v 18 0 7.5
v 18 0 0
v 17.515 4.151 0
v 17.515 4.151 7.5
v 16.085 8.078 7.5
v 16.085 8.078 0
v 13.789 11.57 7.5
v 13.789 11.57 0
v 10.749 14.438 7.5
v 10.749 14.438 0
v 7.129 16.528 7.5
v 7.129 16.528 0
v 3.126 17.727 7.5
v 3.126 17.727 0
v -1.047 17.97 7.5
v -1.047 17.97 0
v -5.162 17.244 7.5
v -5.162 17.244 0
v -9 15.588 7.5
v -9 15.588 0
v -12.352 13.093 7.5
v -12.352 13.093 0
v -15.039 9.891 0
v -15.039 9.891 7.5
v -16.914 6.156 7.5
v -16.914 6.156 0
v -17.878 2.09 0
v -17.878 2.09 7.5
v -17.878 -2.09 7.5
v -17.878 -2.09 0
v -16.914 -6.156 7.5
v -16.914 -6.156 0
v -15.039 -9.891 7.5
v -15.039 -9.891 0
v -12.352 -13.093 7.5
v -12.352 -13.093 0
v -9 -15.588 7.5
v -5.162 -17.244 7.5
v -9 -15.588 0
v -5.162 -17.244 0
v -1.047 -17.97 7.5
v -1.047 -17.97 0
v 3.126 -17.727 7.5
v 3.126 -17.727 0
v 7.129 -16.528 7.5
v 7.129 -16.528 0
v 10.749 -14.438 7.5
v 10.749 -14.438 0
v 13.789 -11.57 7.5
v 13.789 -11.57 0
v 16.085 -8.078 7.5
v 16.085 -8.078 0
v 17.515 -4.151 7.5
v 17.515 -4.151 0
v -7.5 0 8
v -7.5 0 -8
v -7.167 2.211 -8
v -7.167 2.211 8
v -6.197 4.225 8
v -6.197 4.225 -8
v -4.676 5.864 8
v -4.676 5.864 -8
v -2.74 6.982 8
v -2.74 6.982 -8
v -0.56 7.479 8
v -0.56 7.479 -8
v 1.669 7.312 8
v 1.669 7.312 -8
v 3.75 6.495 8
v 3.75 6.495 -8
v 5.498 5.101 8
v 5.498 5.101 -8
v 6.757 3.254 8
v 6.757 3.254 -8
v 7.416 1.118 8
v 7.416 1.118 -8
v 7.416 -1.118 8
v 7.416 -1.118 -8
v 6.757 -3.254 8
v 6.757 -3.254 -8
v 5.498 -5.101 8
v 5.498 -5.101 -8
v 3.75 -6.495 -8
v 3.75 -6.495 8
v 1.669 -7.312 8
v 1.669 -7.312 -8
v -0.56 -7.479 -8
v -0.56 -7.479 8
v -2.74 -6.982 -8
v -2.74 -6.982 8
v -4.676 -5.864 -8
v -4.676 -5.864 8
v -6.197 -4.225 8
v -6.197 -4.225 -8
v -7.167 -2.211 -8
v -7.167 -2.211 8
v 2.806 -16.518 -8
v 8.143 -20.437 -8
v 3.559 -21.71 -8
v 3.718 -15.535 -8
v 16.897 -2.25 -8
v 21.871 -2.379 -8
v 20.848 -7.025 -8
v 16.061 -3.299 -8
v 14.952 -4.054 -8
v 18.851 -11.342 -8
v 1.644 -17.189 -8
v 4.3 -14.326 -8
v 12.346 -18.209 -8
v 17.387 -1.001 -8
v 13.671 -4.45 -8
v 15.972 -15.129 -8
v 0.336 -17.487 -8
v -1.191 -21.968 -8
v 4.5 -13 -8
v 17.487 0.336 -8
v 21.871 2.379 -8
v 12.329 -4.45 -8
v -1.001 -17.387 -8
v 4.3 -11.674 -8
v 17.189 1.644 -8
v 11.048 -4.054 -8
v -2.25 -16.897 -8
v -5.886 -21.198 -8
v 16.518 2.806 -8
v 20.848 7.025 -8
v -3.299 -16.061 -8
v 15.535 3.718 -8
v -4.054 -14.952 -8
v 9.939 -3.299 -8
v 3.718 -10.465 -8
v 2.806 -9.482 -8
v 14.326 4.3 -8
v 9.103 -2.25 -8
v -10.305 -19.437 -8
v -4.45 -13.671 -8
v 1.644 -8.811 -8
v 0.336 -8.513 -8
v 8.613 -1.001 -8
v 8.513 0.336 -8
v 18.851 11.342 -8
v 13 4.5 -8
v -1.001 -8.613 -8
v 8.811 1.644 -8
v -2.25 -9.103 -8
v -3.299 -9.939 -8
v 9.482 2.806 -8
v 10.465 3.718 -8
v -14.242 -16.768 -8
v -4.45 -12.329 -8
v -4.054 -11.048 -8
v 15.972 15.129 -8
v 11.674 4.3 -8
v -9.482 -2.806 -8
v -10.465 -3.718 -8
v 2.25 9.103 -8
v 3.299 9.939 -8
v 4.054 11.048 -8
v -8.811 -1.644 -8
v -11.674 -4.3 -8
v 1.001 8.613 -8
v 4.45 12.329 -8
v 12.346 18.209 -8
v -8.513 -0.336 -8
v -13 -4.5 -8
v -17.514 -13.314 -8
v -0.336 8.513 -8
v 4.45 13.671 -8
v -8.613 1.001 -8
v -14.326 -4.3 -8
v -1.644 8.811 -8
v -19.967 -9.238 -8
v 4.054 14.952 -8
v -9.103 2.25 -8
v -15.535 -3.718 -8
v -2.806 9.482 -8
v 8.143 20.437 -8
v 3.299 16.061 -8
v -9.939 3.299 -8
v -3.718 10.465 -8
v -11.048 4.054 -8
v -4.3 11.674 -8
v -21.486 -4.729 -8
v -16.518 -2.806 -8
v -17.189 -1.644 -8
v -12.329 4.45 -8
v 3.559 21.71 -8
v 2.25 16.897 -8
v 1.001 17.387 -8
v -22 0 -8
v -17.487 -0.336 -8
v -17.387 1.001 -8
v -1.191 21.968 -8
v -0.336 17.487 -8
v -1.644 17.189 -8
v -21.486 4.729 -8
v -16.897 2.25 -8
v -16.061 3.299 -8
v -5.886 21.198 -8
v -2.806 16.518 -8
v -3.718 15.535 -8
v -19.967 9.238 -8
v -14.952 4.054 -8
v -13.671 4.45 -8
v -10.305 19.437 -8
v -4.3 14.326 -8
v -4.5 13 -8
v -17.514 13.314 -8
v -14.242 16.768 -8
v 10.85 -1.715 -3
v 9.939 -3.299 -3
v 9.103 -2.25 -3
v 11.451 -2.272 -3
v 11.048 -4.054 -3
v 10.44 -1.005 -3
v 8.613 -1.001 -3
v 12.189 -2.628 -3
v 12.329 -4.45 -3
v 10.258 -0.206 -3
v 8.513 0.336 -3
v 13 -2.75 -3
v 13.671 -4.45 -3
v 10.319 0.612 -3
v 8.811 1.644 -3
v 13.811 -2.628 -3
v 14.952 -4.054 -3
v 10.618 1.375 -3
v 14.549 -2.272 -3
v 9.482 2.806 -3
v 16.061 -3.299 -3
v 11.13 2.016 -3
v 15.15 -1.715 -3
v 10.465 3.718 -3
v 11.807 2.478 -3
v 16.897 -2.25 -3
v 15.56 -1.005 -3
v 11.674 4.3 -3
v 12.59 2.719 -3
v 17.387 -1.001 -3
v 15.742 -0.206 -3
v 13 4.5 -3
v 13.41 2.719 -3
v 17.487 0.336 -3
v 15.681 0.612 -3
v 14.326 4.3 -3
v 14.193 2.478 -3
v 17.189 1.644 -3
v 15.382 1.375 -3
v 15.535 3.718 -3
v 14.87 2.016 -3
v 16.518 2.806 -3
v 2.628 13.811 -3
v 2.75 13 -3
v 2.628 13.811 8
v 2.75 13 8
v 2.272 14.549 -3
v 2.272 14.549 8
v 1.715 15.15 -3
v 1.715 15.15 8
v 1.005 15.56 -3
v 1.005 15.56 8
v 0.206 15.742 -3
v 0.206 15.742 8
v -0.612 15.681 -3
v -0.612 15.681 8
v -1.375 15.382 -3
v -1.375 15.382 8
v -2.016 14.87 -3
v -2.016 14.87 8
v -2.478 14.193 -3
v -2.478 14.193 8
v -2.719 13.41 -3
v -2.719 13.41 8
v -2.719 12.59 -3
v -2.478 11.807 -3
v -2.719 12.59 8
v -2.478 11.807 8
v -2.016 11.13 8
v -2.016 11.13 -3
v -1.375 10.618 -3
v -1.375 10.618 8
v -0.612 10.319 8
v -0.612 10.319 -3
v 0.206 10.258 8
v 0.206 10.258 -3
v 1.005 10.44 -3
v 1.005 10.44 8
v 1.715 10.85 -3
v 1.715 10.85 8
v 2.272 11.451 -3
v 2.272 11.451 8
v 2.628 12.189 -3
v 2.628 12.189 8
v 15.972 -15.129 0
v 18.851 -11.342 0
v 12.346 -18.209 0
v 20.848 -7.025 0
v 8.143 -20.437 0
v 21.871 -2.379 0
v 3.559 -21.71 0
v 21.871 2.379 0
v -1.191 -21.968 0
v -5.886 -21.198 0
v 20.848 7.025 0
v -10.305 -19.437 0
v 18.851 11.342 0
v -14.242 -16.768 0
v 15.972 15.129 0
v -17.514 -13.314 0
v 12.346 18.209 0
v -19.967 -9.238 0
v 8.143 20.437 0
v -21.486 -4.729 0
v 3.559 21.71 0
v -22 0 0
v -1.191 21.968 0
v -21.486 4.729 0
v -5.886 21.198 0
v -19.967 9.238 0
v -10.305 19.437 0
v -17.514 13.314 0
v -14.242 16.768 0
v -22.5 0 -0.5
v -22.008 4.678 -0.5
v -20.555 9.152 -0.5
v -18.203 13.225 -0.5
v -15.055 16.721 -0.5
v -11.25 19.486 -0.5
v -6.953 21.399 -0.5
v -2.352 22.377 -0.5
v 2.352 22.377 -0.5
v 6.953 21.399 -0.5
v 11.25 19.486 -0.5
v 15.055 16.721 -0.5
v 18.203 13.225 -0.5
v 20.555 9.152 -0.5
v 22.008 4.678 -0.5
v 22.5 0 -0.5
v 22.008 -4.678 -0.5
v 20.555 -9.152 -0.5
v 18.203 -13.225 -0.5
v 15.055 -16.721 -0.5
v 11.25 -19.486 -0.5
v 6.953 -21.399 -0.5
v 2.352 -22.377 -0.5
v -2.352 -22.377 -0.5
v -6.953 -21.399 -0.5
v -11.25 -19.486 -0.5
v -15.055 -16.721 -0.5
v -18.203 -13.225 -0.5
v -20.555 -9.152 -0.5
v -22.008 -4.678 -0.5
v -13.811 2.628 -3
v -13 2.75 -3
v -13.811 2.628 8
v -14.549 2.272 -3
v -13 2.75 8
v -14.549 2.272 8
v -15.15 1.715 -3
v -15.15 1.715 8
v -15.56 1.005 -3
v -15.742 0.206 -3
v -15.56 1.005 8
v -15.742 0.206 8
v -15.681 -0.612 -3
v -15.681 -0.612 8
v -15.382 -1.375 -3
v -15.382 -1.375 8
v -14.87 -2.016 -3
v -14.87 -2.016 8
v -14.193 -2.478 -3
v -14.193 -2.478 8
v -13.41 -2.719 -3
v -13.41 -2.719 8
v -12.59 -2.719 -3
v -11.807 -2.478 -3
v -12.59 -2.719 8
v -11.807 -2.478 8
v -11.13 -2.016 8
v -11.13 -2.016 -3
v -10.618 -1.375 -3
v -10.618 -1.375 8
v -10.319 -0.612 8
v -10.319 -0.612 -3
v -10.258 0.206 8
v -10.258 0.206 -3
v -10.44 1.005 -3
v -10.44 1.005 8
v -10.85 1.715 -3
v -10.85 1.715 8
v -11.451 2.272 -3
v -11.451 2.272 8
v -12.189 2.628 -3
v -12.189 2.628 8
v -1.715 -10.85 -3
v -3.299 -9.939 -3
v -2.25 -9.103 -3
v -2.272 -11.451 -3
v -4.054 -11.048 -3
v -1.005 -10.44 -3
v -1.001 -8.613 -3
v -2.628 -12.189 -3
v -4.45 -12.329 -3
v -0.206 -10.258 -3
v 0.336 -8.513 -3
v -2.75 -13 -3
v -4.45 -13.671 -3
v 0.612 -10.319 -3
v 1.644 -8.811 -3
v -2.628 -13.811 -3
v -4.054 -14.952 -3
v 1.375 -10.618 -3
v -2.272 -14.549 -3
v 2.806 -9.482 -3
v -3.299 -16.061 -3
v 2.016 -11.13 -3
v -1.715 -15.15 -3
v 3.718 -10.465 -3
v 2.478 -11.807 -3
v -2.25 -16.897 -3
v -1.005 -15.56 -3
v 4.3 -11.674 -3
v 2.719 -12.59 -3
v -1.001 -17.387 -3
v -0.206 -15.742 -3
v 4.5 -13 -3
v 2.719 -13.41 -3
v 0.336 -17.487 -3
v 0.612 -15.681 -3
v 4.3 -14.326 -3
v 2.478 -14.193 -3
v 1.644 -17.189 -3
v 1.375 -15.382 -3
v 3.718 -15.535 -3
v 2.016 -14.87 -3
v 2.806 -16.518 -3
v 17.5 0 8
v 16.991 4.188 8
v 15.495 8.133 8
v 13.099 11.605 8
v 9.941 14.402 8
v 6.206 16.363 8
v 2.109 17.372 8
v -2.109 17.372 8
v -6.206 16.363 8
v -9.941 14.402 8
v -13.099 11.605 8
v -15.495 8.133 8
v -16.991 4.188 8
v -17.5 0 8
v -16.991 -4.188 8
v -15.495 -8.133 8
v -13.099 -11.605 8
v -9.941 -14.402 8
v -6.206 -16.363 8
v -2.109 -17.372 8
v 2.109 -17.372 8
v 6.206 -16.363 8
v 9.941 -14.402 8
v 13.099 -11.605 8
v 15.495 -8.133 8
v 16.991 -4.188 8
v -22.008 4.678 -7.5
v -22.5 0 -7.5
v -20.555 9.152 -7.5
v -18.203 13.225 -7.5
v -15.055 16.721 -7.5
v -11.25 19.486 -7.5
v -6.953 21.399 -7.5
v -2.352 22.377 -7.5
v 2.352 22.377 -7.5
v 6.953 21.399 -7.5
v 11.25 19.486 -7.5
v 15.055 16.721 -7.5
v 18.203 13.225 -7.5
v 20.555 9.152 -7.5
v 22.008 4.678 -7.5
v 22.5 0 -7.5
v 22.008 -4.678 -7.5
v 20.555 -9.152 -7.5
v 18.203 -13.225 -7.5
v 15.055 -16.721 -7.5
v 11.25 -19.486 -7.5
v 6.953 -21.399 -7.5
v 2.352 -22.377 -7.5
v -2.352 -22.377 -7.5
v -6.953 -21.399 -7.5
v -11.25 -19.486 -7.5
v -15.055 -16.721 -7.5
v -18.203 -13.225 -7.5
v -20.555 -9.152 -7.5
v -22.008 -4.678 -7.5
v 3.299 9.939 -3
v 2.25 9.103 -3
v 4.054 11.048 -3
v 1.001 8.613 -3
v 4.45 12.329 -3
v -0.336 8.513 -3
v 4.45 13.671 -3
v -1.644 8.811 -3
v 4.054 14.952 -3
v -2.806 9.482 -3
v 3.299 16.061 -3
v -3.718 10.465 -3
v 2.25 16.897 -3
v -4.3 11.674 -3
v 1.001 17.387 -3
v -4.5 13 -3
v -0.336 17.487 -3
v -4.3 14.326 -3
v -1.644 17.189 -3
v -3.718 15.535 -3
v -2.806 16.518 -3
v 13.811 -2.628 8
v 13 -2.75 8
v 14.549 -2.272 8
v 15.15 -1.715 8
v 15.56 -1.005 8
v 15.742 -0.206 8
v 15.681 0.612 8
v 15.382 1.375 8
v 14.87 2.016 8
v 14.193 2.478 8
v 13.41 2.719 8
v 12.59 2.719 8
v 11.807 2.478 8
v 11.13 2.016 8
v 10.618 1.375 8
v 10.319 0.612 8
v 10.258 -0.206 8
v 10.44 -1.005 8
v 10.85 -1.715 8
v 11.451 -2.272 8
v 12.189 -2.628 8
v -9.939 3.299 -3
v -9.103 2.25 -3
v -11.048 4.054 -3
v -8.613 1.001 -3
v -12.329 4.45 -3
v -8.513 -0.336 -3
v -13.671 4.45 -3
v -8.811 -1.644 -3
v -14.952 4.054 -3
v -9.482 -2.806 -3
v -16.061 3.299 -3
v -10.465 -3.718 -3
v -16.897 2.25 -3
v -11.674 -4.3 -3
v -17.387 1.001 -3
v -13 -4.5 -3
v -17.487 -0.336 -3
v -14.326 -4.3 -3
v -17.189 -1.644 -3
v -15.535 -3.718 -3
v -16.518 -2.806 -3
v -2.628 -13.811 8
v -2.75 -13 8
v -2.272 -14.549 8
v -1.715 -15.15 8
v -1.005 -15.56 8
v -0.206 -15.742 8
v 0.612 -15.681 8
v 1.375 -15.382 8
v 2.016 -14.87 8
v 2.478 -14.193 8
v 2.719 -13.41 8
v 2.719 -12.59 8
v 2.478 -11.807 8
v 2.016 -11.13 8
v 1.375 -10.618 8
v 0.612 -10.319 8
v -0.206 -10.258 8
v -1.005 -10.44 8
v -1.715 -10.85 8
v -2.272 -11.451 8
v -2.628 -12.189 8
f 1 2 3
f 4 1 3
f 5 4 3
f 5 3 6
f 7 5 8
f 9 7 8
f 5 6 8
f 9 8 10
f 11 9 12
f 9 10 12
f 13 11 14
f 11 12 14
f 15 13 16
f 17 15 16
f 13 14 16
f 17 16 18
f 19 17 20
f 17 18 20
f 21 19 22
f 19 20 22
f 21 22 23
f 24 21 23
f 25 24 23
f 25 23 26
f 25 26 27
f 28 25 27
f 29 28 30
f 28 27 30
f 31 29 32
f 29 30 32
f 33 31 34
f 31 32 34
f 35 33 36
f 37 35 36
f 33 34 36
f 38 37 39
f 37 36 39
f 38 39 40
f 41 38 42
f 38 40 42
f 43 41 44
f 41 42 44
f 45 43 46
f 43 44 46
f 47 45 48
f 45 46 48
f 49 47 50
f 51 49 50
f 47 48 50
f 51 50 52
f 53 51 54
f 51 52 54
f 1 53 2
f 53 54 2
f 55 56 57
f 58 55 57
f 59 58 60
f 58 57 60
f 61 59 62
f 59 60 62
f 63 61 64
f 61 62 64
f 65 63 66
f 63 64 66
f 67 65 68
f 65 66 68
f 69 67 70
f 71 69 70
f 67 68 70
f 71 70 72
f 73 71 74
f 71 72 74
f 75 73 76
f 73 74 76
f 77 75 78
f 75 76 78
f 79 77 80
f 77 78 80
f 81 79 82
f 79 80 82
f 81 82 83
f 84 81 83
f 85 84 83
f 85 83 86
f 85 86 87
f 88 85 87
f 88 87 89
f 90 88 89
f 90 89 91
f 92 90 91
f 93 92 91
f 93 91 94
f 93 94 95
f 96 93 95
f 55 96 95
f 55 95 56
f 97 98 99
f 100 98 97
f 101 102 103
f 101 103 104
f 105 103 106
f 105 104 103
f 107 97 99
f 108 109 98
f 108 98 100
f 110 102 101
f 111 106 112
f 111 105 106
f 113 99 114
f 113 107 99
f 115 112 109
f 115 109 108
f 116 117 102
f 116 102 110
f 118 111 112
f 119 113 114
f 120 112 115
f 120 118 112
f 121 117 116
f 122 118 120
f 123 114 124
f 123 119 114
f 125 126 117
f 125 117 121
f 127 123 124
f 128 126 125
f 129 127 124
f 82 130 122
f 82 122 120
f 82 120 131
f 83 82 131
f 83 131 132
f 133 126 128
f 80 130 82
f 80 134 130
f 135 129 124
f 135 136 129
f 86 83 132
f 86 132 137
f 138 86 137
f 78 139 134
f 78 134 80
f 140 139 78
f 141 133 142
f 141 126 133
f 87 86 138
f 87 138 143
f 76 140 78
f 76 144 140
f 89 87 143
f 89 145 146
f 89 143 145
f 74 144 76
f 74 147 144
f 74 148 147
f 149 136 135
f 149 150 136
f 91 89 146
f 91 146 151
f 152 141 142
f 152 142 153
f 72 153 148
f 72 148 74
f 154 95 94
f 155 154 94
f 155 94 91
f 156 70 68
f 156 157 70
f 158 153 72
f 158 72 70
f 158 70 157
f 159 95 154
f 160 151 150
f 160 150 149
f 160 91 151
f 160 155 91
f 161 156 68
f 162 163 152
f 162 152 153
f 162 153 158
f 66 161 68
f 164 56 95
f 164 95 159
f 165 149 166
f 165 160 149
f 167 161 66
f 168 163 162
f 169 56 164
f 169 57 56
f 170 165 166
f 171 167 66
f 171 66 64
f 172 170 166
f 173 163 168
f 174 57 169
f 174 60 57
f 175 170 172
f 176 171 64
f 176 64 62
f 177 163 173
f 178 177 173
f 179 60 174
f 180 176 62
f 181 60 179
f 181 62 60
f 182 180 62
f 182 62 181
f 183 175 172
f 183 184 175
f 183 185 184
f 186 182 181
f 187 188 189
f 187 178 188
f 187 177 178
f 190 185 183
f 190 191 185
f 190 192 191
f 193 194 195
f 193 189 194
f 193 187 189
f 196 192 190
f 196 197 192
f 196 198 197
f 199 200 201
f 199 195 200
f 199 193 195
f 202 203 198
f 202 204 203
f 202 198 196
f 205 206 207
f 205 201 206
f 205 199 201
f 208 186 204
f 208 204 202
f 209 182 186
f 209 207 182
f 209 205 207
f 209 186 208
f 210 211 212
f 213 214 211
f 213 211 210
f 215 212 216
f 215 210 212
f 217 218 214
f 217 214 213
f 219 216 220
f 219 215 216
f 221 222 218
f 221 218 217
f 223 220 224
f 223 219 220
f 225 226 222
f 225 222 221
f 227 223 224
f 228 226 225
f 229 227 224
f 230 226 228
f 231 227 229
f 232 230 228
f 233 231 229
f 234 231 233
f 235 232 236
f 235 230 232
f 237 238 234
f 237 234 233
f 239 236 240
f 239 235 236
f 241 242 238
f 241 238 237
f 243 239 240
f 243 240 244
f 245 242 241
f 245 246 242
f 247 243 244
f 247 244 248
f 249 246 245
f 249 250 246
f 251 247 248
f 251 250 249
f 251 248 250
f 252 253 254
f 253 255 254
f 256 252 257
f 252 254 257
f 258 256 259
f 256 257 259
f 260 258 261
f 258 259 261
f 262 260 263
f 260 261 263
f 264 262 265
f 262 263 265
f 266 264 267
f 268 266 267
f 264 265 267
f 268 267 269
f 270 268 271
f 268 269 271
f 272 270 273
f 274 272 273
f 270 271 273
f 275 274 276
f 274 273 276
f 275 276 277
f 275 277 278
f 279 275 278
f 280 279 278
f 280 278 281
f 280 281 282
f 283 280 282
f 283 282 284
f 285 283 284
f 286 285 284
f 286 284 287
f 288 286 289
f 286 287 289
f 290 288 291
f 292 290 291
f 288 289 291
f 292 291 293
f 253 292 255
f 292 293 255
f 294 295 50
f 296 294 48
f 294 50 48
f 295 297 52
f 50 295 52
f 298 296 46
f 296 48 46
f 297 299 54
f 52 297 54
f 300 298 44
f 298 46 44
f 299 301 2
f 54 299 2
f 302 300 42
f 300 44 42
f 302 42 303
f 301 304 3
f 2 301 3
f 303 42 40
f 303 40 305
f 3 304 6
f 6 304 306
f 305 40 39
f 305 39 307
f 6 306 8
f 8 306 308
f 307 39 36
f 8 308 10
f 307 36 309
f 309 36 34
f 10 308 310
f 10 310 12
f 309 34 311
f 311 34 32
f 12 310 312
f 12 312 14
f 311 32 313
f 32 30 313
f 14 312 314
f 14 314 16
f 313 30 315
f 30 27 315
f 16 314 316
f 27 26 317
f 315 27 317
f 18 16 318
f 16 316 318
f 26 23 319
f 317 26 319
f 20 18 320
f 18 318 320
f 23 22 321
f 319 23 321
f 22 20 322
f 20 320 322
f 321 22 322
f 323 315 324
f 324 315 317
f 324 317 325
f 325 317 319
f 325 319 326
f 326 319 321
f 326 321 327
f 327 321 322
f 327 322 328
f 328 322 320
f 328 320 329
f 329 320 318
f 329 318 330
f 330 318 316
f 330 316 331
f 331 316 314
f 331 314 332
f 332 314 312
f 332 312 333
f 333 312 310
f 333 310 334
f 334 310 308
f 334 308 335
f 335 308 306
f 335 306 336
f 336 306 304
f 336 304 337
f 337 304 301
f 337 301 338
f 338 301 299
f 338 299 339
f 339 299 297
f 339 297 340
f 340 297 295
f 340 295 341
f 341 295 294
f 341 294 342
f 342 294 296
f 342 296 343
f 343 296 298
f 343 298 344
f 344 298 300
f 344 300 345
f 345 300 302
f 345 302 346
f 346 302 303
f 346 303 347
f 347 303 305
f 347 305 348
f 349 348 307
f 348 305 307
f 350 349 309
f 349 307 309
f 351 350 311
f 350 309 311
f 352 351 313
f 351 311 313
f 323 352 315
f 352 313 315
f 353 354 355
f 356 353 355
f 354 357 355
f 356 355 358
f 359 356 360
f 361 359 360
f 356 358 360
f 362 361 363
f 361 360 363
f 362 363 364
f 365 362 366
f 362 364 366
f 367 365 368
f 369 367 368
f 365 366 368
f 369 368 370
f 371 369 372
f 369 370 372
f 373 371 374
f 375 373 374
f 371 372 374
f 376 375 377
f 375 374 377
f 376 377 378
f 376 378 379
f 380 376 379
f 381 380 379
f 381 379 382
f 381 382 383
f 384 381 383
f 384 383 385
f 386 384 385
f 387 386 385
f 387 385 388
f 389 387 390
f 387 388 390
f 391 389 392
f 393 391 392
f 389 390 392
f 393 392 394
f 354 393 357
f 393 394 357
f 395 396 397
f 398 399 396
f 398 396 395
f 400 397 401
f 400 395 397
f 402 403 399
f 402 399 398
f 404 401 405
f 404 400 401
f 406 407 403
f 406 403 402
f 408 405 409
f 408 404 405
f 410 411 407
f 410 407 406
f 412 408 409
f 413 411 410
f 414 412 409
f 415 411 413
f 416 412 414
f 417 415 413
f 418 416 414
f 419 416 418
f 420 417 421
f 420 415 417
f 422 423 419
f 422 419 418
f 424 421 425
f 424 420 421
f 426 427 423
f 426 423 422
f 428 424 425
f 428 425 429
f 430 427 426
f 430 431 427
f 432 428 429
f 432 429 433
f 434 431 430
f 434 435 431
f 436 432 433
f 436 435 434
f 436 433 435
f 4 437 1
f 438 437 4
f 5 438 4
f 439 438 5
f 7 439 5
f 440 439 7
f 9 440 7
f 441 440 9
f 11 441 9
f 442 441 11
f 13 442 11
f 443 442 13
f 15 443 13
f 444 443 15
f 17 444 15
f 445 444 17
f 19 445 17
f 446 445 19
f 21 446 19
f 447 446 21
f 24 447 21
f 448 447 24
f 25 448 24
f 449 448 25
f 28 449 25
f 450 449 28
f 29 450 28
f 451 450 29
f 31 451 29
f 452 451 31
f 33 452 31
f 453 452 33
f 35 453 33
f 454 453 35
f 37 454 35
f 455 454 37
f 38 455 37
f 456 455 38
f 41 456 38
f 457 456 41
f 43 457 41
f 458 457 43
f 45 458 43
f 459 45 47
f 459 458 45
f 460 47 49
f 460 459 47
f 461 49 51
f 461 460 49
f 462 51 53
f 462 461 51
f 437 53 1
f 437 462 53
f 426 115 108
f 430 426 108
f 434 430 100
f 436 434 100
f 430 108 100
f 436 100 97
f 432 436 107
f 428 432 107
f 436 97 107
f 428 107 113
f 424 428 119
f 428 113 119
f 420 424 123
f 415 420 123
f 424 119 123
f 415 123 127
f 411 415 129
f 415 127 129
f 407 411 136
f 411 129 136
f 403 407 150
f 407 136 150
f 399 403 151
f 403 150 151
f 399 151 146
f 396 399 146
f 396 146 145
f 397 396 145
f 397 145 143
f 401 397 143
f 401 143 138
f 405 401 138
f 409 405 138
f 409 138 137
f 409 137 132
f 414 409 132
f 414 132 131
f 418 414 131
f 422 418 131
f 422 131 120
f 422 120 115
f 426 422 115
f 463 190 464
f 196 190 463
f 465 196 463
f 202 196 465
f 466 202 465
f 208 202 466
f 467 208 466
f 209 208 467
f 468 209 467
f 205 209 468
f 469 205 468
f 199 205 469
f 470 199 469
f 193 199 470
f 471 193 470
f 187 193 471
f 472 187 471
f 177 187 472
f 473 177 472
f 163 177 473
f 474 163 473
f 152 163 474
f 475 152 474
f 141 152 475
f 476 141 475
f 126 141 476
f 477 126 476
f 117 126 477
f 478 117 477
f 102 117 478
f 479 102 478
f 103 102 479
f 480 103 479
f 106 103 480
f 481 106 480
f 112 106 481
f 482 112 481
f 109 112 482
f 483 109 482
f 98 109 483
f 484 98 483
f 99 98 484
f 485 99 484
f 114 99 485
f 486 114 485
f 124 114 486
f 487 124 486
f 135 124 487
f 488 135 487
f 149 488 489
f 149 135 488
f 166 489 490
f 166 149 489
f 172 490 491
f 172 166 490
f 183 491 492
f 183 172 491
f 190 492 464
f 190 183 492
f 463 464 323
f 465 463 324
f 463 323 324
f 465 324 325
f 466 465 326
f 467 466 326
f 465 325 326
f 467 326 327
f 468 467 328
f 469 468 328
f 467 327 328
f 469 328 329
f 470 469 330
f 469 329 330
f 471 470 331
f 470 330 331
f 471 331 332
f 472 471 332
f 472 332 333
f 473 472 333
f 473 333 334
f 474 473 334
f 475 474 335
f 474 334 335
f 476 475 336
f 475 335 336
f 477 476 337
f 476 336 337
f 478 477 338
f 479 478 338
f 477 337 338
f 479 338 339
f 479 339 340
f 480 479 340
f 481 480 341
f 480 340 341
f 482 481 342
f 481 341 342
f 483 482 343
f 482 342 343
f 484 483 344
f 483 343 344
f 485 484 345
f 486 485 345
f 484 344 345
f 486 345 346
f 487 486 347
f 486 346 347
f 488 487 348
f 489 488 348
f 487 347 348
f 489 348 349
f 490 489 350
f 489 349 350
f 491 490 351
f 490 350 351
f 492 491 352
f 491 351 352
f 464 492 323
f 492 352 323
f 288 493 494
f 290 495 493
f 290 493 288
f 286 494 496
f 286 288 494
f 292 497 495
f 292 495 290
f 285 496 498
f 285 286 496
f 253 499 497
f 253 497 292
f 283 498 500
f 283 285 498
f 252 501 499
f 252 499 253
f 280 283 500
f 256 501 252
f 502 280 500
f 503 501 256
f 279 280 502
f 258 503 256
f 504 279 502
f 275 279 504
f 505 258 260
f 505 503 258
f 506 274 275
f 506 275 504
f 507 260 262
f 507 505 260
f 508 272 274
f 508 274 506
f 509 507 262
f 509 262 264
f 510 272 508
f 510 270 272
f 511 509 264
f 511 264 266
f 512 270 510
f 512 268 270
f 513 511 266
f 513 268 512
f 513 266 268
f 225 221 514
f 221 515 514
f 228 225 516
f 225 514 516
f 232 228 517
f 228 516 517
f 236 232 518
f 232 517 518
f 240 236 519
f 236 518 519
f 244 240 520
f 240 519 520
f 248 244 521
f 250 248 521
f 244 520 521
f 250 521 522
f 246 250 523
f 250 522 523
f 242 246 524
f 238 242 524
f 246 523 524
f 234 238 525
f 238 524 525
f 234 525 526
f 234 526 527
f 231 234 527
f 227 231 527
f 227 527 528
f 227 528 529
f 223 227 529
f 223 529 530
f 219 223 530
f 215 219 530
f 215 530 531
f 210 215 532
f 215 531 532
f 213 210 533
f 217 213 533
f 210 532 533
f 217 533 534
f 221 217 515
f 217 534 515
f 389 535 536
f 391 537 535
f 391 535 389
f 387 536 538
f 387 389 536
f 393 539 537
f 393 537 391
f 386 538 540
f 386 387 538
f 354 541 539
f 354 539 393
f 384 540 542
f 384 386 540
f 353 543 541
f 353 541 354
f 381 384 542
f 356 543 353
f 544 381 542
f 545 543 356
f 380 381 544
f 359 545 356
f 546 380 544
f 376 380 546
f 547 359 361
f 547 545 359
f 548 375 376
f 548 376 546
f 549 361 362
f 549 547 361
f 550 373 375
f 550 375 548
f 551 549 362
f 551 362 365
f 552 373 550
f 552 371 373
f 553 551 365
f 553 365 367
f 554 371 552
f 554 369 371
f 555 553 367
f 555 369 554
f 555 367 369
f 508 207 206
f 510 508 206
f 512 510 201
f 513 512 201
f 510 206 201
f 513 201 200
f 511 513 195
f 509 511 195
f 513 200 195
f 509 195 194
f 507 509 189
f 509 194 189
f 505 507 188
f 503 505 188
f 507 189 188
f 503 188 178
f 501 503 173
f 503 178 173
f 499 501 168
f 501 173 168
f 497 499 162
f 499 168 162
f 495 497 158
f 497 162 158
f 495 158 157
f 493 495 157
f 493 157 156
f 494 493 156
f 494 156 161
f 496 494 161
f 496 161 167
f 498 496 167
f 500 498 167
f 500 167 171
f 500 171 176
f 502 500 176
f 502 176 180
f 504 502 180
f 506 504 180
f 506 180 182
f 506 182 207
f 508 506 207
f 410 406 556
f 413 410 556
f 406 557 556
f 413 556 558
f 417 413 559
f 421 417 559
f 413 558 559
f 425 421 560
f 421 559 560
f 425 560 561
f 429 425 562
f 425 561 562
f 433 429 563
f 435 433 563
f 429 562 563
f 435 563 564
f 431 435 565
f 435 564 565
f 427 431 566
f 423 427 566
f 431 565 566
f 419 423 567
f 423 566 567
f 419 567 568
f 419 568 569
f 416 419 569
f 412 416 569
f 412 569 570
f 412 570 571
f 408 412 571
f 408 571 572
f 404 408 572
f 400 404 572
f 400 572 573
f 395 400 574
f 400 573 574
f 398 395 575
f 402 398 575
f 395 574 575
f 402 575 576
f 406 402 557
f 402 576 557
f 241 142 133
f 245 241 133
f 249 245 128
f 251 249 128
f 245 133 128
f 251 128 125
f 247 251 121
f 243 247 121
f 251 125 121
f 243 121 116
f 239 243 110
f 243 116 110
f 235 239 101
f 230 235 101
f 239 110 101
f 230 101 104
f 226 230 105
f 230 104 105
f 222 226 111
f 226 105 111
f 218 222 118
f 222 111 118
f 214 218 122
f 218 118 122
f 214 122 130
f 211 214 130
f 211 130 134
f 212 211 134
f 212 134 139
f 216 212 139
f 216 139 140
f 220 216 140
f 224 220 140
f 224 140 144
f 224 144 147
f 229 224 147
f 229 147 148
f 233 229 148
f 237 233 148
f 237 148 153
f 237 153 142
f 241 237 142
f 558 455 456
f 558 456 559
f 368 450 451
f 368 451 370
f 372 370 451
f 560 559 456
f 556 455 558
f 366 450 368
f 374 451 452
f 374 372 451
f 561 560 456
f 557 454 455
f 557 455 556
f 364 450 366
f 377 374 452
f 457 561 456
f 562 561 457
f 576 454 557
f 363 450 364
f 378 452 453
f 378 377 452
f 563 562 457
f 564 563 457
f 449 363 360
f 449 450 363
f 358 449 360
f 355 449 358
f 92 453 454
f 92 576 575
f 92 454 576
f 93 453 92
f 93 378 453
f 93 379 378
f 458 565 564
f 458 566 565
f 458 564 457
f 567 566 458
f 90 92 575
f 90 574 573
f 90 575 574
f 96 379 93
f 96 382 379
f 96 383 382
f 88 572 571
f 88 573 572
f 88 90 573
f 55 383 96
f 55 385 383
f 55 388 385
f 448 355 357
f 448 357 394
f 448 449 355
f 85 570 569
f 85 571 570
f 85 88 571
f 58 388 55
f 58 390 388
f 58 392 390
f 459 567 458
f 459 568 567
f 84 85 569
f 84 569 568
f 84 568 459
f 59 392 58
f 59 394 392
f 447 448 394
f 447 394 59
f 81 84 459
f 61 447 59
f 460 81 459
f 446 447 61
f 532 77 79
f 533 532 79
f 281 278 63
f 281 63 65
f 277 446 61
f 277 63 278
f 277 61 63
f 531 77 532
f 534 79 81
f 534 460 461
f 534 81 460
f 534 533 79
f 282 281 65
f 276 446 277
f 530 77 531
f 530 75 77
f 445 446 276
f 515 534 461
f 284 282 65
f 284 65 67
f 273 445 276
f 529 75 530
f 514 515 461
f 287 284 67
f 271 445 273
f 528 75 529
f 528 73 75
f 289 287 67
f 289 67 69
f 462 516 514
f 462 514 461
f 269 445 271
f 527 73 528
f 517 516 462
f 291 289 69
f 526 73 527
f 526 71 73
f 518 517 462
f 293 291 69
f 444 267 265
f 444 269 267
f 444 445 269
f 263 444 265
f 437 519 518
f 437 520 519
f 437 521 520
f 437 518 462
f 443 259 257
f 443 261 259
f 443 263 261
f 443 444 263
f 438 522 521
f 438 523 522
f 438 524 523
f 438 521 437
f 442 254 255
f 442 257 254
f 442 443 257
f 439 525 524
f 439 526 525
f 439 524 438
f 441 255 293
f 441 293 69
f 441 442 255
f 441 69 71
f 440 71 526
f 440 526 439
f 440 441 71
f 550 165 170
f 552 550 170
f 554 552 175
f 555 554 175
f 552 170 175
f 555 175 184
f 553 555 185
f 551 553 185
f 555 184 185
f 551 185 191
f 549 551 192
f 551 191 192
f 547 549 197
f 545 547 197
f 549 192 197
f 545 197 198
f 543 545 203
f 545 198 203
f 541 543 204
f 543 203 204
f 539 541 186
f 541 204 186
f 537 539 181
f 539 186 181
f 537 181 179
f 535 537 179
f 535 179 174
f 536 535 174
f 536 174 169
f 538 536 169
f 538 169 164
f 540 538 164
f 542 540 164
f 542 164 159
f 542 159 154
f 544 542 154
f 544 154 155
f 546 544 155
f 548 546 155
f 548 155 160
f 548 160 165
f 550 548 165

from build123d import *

# Parameters (mm, degrees)
SKETCH1_R                      = 18
BOSS_EXTRUDE1_DEPTH            = 8
SKETCH2_R                      = 22.5
BOSS_EXTRUDE2_DEPTH            = 8
CHAMFER1_SIZE                  = 0.5
SKETCH3_R                      = 7.5
CUT_EXTRUDE1_DEPTH             = 36.616007637
CBORE_FOR_M5_SHCS1_D           = 5.5
CBORE_FOR_M5_SHCS1_CBORE_D     = 9
CBORE_FOR_M5_SHCS1_CBORE_DEPTH = 5
CIRPATTERN1_COUNT              = 4


with BuildPart() as part:
    # Sketch1 → Boss-Extrude1 (new body)
    with BuildSketch(Plane.XY):
        Circle(SKETCH1_R)
    extrude(amount=BOSS_EXTRUDE1_DEPTH)

    # Sketch2 → Boss-Extrude2 (add)
    with BuildSketch(Plane(origin=(0, 0, 0), x_dir=(-1, 0, 0), z_dir=(0, 0, -1))):
        Circle(SKETCH2_R)
    extrude(amount=BOSS_EXTRUDE2_DEPTH)

    # Chamfer1
    chamfer1_edges = [part.edges().sort_by_distance(p)[0] for p in [
        (-18, 0, 8),
        (22.5, 0, 0),
        (22.5, 0, -8),
    ]]
    chamfer(chamfer1_edges, length=CHAMFER1_SIZE)

    # Sketch3 → Cut-Extrude1 (cut, through all)
    with BuildSketch(Plane(origin=(0, 0, -8), x_dir=(-1, 0, 0), z_dir=(0, 0, -1))):
        Circle(SKETCH3_R)
    extrude(amount=-CUT_EXTRUDE1_DEPTH, mode=Mode.SUBTRACT)

    # CBORE for M5 SHCS1 (through all)
    with Locations(Plane(origin=(0, 0, -8), x_dir=(-1, 0, 0), z_dir=(0, 0, -1))):
        with Locations((0, 13)):
            cbore_for_m5_shcs1 = CounterBoreHole(CBORE_FOR_M5_SHCS1_D / 2, CBORE_FOR_M5_SHCS1_CBORE_D / 2, CBORE_FOR_M5_SHCS1_CBORE_DEPTH)

    # CirPattern1: CBORE for M5 SHCS1 ×4 about axis
    cirpattern1_axis = Axis((0, 0, 0), (0, 0, 1))
    for i in range(1, CIRPATTERN1_COUNT):
        add(cbore_for_m5_shcs1.rotate(cirpattern1_axis, i * 360 / CIRPATTERN1_COUNT), mode=Mode.SUBTRACT)


solid = part.part
